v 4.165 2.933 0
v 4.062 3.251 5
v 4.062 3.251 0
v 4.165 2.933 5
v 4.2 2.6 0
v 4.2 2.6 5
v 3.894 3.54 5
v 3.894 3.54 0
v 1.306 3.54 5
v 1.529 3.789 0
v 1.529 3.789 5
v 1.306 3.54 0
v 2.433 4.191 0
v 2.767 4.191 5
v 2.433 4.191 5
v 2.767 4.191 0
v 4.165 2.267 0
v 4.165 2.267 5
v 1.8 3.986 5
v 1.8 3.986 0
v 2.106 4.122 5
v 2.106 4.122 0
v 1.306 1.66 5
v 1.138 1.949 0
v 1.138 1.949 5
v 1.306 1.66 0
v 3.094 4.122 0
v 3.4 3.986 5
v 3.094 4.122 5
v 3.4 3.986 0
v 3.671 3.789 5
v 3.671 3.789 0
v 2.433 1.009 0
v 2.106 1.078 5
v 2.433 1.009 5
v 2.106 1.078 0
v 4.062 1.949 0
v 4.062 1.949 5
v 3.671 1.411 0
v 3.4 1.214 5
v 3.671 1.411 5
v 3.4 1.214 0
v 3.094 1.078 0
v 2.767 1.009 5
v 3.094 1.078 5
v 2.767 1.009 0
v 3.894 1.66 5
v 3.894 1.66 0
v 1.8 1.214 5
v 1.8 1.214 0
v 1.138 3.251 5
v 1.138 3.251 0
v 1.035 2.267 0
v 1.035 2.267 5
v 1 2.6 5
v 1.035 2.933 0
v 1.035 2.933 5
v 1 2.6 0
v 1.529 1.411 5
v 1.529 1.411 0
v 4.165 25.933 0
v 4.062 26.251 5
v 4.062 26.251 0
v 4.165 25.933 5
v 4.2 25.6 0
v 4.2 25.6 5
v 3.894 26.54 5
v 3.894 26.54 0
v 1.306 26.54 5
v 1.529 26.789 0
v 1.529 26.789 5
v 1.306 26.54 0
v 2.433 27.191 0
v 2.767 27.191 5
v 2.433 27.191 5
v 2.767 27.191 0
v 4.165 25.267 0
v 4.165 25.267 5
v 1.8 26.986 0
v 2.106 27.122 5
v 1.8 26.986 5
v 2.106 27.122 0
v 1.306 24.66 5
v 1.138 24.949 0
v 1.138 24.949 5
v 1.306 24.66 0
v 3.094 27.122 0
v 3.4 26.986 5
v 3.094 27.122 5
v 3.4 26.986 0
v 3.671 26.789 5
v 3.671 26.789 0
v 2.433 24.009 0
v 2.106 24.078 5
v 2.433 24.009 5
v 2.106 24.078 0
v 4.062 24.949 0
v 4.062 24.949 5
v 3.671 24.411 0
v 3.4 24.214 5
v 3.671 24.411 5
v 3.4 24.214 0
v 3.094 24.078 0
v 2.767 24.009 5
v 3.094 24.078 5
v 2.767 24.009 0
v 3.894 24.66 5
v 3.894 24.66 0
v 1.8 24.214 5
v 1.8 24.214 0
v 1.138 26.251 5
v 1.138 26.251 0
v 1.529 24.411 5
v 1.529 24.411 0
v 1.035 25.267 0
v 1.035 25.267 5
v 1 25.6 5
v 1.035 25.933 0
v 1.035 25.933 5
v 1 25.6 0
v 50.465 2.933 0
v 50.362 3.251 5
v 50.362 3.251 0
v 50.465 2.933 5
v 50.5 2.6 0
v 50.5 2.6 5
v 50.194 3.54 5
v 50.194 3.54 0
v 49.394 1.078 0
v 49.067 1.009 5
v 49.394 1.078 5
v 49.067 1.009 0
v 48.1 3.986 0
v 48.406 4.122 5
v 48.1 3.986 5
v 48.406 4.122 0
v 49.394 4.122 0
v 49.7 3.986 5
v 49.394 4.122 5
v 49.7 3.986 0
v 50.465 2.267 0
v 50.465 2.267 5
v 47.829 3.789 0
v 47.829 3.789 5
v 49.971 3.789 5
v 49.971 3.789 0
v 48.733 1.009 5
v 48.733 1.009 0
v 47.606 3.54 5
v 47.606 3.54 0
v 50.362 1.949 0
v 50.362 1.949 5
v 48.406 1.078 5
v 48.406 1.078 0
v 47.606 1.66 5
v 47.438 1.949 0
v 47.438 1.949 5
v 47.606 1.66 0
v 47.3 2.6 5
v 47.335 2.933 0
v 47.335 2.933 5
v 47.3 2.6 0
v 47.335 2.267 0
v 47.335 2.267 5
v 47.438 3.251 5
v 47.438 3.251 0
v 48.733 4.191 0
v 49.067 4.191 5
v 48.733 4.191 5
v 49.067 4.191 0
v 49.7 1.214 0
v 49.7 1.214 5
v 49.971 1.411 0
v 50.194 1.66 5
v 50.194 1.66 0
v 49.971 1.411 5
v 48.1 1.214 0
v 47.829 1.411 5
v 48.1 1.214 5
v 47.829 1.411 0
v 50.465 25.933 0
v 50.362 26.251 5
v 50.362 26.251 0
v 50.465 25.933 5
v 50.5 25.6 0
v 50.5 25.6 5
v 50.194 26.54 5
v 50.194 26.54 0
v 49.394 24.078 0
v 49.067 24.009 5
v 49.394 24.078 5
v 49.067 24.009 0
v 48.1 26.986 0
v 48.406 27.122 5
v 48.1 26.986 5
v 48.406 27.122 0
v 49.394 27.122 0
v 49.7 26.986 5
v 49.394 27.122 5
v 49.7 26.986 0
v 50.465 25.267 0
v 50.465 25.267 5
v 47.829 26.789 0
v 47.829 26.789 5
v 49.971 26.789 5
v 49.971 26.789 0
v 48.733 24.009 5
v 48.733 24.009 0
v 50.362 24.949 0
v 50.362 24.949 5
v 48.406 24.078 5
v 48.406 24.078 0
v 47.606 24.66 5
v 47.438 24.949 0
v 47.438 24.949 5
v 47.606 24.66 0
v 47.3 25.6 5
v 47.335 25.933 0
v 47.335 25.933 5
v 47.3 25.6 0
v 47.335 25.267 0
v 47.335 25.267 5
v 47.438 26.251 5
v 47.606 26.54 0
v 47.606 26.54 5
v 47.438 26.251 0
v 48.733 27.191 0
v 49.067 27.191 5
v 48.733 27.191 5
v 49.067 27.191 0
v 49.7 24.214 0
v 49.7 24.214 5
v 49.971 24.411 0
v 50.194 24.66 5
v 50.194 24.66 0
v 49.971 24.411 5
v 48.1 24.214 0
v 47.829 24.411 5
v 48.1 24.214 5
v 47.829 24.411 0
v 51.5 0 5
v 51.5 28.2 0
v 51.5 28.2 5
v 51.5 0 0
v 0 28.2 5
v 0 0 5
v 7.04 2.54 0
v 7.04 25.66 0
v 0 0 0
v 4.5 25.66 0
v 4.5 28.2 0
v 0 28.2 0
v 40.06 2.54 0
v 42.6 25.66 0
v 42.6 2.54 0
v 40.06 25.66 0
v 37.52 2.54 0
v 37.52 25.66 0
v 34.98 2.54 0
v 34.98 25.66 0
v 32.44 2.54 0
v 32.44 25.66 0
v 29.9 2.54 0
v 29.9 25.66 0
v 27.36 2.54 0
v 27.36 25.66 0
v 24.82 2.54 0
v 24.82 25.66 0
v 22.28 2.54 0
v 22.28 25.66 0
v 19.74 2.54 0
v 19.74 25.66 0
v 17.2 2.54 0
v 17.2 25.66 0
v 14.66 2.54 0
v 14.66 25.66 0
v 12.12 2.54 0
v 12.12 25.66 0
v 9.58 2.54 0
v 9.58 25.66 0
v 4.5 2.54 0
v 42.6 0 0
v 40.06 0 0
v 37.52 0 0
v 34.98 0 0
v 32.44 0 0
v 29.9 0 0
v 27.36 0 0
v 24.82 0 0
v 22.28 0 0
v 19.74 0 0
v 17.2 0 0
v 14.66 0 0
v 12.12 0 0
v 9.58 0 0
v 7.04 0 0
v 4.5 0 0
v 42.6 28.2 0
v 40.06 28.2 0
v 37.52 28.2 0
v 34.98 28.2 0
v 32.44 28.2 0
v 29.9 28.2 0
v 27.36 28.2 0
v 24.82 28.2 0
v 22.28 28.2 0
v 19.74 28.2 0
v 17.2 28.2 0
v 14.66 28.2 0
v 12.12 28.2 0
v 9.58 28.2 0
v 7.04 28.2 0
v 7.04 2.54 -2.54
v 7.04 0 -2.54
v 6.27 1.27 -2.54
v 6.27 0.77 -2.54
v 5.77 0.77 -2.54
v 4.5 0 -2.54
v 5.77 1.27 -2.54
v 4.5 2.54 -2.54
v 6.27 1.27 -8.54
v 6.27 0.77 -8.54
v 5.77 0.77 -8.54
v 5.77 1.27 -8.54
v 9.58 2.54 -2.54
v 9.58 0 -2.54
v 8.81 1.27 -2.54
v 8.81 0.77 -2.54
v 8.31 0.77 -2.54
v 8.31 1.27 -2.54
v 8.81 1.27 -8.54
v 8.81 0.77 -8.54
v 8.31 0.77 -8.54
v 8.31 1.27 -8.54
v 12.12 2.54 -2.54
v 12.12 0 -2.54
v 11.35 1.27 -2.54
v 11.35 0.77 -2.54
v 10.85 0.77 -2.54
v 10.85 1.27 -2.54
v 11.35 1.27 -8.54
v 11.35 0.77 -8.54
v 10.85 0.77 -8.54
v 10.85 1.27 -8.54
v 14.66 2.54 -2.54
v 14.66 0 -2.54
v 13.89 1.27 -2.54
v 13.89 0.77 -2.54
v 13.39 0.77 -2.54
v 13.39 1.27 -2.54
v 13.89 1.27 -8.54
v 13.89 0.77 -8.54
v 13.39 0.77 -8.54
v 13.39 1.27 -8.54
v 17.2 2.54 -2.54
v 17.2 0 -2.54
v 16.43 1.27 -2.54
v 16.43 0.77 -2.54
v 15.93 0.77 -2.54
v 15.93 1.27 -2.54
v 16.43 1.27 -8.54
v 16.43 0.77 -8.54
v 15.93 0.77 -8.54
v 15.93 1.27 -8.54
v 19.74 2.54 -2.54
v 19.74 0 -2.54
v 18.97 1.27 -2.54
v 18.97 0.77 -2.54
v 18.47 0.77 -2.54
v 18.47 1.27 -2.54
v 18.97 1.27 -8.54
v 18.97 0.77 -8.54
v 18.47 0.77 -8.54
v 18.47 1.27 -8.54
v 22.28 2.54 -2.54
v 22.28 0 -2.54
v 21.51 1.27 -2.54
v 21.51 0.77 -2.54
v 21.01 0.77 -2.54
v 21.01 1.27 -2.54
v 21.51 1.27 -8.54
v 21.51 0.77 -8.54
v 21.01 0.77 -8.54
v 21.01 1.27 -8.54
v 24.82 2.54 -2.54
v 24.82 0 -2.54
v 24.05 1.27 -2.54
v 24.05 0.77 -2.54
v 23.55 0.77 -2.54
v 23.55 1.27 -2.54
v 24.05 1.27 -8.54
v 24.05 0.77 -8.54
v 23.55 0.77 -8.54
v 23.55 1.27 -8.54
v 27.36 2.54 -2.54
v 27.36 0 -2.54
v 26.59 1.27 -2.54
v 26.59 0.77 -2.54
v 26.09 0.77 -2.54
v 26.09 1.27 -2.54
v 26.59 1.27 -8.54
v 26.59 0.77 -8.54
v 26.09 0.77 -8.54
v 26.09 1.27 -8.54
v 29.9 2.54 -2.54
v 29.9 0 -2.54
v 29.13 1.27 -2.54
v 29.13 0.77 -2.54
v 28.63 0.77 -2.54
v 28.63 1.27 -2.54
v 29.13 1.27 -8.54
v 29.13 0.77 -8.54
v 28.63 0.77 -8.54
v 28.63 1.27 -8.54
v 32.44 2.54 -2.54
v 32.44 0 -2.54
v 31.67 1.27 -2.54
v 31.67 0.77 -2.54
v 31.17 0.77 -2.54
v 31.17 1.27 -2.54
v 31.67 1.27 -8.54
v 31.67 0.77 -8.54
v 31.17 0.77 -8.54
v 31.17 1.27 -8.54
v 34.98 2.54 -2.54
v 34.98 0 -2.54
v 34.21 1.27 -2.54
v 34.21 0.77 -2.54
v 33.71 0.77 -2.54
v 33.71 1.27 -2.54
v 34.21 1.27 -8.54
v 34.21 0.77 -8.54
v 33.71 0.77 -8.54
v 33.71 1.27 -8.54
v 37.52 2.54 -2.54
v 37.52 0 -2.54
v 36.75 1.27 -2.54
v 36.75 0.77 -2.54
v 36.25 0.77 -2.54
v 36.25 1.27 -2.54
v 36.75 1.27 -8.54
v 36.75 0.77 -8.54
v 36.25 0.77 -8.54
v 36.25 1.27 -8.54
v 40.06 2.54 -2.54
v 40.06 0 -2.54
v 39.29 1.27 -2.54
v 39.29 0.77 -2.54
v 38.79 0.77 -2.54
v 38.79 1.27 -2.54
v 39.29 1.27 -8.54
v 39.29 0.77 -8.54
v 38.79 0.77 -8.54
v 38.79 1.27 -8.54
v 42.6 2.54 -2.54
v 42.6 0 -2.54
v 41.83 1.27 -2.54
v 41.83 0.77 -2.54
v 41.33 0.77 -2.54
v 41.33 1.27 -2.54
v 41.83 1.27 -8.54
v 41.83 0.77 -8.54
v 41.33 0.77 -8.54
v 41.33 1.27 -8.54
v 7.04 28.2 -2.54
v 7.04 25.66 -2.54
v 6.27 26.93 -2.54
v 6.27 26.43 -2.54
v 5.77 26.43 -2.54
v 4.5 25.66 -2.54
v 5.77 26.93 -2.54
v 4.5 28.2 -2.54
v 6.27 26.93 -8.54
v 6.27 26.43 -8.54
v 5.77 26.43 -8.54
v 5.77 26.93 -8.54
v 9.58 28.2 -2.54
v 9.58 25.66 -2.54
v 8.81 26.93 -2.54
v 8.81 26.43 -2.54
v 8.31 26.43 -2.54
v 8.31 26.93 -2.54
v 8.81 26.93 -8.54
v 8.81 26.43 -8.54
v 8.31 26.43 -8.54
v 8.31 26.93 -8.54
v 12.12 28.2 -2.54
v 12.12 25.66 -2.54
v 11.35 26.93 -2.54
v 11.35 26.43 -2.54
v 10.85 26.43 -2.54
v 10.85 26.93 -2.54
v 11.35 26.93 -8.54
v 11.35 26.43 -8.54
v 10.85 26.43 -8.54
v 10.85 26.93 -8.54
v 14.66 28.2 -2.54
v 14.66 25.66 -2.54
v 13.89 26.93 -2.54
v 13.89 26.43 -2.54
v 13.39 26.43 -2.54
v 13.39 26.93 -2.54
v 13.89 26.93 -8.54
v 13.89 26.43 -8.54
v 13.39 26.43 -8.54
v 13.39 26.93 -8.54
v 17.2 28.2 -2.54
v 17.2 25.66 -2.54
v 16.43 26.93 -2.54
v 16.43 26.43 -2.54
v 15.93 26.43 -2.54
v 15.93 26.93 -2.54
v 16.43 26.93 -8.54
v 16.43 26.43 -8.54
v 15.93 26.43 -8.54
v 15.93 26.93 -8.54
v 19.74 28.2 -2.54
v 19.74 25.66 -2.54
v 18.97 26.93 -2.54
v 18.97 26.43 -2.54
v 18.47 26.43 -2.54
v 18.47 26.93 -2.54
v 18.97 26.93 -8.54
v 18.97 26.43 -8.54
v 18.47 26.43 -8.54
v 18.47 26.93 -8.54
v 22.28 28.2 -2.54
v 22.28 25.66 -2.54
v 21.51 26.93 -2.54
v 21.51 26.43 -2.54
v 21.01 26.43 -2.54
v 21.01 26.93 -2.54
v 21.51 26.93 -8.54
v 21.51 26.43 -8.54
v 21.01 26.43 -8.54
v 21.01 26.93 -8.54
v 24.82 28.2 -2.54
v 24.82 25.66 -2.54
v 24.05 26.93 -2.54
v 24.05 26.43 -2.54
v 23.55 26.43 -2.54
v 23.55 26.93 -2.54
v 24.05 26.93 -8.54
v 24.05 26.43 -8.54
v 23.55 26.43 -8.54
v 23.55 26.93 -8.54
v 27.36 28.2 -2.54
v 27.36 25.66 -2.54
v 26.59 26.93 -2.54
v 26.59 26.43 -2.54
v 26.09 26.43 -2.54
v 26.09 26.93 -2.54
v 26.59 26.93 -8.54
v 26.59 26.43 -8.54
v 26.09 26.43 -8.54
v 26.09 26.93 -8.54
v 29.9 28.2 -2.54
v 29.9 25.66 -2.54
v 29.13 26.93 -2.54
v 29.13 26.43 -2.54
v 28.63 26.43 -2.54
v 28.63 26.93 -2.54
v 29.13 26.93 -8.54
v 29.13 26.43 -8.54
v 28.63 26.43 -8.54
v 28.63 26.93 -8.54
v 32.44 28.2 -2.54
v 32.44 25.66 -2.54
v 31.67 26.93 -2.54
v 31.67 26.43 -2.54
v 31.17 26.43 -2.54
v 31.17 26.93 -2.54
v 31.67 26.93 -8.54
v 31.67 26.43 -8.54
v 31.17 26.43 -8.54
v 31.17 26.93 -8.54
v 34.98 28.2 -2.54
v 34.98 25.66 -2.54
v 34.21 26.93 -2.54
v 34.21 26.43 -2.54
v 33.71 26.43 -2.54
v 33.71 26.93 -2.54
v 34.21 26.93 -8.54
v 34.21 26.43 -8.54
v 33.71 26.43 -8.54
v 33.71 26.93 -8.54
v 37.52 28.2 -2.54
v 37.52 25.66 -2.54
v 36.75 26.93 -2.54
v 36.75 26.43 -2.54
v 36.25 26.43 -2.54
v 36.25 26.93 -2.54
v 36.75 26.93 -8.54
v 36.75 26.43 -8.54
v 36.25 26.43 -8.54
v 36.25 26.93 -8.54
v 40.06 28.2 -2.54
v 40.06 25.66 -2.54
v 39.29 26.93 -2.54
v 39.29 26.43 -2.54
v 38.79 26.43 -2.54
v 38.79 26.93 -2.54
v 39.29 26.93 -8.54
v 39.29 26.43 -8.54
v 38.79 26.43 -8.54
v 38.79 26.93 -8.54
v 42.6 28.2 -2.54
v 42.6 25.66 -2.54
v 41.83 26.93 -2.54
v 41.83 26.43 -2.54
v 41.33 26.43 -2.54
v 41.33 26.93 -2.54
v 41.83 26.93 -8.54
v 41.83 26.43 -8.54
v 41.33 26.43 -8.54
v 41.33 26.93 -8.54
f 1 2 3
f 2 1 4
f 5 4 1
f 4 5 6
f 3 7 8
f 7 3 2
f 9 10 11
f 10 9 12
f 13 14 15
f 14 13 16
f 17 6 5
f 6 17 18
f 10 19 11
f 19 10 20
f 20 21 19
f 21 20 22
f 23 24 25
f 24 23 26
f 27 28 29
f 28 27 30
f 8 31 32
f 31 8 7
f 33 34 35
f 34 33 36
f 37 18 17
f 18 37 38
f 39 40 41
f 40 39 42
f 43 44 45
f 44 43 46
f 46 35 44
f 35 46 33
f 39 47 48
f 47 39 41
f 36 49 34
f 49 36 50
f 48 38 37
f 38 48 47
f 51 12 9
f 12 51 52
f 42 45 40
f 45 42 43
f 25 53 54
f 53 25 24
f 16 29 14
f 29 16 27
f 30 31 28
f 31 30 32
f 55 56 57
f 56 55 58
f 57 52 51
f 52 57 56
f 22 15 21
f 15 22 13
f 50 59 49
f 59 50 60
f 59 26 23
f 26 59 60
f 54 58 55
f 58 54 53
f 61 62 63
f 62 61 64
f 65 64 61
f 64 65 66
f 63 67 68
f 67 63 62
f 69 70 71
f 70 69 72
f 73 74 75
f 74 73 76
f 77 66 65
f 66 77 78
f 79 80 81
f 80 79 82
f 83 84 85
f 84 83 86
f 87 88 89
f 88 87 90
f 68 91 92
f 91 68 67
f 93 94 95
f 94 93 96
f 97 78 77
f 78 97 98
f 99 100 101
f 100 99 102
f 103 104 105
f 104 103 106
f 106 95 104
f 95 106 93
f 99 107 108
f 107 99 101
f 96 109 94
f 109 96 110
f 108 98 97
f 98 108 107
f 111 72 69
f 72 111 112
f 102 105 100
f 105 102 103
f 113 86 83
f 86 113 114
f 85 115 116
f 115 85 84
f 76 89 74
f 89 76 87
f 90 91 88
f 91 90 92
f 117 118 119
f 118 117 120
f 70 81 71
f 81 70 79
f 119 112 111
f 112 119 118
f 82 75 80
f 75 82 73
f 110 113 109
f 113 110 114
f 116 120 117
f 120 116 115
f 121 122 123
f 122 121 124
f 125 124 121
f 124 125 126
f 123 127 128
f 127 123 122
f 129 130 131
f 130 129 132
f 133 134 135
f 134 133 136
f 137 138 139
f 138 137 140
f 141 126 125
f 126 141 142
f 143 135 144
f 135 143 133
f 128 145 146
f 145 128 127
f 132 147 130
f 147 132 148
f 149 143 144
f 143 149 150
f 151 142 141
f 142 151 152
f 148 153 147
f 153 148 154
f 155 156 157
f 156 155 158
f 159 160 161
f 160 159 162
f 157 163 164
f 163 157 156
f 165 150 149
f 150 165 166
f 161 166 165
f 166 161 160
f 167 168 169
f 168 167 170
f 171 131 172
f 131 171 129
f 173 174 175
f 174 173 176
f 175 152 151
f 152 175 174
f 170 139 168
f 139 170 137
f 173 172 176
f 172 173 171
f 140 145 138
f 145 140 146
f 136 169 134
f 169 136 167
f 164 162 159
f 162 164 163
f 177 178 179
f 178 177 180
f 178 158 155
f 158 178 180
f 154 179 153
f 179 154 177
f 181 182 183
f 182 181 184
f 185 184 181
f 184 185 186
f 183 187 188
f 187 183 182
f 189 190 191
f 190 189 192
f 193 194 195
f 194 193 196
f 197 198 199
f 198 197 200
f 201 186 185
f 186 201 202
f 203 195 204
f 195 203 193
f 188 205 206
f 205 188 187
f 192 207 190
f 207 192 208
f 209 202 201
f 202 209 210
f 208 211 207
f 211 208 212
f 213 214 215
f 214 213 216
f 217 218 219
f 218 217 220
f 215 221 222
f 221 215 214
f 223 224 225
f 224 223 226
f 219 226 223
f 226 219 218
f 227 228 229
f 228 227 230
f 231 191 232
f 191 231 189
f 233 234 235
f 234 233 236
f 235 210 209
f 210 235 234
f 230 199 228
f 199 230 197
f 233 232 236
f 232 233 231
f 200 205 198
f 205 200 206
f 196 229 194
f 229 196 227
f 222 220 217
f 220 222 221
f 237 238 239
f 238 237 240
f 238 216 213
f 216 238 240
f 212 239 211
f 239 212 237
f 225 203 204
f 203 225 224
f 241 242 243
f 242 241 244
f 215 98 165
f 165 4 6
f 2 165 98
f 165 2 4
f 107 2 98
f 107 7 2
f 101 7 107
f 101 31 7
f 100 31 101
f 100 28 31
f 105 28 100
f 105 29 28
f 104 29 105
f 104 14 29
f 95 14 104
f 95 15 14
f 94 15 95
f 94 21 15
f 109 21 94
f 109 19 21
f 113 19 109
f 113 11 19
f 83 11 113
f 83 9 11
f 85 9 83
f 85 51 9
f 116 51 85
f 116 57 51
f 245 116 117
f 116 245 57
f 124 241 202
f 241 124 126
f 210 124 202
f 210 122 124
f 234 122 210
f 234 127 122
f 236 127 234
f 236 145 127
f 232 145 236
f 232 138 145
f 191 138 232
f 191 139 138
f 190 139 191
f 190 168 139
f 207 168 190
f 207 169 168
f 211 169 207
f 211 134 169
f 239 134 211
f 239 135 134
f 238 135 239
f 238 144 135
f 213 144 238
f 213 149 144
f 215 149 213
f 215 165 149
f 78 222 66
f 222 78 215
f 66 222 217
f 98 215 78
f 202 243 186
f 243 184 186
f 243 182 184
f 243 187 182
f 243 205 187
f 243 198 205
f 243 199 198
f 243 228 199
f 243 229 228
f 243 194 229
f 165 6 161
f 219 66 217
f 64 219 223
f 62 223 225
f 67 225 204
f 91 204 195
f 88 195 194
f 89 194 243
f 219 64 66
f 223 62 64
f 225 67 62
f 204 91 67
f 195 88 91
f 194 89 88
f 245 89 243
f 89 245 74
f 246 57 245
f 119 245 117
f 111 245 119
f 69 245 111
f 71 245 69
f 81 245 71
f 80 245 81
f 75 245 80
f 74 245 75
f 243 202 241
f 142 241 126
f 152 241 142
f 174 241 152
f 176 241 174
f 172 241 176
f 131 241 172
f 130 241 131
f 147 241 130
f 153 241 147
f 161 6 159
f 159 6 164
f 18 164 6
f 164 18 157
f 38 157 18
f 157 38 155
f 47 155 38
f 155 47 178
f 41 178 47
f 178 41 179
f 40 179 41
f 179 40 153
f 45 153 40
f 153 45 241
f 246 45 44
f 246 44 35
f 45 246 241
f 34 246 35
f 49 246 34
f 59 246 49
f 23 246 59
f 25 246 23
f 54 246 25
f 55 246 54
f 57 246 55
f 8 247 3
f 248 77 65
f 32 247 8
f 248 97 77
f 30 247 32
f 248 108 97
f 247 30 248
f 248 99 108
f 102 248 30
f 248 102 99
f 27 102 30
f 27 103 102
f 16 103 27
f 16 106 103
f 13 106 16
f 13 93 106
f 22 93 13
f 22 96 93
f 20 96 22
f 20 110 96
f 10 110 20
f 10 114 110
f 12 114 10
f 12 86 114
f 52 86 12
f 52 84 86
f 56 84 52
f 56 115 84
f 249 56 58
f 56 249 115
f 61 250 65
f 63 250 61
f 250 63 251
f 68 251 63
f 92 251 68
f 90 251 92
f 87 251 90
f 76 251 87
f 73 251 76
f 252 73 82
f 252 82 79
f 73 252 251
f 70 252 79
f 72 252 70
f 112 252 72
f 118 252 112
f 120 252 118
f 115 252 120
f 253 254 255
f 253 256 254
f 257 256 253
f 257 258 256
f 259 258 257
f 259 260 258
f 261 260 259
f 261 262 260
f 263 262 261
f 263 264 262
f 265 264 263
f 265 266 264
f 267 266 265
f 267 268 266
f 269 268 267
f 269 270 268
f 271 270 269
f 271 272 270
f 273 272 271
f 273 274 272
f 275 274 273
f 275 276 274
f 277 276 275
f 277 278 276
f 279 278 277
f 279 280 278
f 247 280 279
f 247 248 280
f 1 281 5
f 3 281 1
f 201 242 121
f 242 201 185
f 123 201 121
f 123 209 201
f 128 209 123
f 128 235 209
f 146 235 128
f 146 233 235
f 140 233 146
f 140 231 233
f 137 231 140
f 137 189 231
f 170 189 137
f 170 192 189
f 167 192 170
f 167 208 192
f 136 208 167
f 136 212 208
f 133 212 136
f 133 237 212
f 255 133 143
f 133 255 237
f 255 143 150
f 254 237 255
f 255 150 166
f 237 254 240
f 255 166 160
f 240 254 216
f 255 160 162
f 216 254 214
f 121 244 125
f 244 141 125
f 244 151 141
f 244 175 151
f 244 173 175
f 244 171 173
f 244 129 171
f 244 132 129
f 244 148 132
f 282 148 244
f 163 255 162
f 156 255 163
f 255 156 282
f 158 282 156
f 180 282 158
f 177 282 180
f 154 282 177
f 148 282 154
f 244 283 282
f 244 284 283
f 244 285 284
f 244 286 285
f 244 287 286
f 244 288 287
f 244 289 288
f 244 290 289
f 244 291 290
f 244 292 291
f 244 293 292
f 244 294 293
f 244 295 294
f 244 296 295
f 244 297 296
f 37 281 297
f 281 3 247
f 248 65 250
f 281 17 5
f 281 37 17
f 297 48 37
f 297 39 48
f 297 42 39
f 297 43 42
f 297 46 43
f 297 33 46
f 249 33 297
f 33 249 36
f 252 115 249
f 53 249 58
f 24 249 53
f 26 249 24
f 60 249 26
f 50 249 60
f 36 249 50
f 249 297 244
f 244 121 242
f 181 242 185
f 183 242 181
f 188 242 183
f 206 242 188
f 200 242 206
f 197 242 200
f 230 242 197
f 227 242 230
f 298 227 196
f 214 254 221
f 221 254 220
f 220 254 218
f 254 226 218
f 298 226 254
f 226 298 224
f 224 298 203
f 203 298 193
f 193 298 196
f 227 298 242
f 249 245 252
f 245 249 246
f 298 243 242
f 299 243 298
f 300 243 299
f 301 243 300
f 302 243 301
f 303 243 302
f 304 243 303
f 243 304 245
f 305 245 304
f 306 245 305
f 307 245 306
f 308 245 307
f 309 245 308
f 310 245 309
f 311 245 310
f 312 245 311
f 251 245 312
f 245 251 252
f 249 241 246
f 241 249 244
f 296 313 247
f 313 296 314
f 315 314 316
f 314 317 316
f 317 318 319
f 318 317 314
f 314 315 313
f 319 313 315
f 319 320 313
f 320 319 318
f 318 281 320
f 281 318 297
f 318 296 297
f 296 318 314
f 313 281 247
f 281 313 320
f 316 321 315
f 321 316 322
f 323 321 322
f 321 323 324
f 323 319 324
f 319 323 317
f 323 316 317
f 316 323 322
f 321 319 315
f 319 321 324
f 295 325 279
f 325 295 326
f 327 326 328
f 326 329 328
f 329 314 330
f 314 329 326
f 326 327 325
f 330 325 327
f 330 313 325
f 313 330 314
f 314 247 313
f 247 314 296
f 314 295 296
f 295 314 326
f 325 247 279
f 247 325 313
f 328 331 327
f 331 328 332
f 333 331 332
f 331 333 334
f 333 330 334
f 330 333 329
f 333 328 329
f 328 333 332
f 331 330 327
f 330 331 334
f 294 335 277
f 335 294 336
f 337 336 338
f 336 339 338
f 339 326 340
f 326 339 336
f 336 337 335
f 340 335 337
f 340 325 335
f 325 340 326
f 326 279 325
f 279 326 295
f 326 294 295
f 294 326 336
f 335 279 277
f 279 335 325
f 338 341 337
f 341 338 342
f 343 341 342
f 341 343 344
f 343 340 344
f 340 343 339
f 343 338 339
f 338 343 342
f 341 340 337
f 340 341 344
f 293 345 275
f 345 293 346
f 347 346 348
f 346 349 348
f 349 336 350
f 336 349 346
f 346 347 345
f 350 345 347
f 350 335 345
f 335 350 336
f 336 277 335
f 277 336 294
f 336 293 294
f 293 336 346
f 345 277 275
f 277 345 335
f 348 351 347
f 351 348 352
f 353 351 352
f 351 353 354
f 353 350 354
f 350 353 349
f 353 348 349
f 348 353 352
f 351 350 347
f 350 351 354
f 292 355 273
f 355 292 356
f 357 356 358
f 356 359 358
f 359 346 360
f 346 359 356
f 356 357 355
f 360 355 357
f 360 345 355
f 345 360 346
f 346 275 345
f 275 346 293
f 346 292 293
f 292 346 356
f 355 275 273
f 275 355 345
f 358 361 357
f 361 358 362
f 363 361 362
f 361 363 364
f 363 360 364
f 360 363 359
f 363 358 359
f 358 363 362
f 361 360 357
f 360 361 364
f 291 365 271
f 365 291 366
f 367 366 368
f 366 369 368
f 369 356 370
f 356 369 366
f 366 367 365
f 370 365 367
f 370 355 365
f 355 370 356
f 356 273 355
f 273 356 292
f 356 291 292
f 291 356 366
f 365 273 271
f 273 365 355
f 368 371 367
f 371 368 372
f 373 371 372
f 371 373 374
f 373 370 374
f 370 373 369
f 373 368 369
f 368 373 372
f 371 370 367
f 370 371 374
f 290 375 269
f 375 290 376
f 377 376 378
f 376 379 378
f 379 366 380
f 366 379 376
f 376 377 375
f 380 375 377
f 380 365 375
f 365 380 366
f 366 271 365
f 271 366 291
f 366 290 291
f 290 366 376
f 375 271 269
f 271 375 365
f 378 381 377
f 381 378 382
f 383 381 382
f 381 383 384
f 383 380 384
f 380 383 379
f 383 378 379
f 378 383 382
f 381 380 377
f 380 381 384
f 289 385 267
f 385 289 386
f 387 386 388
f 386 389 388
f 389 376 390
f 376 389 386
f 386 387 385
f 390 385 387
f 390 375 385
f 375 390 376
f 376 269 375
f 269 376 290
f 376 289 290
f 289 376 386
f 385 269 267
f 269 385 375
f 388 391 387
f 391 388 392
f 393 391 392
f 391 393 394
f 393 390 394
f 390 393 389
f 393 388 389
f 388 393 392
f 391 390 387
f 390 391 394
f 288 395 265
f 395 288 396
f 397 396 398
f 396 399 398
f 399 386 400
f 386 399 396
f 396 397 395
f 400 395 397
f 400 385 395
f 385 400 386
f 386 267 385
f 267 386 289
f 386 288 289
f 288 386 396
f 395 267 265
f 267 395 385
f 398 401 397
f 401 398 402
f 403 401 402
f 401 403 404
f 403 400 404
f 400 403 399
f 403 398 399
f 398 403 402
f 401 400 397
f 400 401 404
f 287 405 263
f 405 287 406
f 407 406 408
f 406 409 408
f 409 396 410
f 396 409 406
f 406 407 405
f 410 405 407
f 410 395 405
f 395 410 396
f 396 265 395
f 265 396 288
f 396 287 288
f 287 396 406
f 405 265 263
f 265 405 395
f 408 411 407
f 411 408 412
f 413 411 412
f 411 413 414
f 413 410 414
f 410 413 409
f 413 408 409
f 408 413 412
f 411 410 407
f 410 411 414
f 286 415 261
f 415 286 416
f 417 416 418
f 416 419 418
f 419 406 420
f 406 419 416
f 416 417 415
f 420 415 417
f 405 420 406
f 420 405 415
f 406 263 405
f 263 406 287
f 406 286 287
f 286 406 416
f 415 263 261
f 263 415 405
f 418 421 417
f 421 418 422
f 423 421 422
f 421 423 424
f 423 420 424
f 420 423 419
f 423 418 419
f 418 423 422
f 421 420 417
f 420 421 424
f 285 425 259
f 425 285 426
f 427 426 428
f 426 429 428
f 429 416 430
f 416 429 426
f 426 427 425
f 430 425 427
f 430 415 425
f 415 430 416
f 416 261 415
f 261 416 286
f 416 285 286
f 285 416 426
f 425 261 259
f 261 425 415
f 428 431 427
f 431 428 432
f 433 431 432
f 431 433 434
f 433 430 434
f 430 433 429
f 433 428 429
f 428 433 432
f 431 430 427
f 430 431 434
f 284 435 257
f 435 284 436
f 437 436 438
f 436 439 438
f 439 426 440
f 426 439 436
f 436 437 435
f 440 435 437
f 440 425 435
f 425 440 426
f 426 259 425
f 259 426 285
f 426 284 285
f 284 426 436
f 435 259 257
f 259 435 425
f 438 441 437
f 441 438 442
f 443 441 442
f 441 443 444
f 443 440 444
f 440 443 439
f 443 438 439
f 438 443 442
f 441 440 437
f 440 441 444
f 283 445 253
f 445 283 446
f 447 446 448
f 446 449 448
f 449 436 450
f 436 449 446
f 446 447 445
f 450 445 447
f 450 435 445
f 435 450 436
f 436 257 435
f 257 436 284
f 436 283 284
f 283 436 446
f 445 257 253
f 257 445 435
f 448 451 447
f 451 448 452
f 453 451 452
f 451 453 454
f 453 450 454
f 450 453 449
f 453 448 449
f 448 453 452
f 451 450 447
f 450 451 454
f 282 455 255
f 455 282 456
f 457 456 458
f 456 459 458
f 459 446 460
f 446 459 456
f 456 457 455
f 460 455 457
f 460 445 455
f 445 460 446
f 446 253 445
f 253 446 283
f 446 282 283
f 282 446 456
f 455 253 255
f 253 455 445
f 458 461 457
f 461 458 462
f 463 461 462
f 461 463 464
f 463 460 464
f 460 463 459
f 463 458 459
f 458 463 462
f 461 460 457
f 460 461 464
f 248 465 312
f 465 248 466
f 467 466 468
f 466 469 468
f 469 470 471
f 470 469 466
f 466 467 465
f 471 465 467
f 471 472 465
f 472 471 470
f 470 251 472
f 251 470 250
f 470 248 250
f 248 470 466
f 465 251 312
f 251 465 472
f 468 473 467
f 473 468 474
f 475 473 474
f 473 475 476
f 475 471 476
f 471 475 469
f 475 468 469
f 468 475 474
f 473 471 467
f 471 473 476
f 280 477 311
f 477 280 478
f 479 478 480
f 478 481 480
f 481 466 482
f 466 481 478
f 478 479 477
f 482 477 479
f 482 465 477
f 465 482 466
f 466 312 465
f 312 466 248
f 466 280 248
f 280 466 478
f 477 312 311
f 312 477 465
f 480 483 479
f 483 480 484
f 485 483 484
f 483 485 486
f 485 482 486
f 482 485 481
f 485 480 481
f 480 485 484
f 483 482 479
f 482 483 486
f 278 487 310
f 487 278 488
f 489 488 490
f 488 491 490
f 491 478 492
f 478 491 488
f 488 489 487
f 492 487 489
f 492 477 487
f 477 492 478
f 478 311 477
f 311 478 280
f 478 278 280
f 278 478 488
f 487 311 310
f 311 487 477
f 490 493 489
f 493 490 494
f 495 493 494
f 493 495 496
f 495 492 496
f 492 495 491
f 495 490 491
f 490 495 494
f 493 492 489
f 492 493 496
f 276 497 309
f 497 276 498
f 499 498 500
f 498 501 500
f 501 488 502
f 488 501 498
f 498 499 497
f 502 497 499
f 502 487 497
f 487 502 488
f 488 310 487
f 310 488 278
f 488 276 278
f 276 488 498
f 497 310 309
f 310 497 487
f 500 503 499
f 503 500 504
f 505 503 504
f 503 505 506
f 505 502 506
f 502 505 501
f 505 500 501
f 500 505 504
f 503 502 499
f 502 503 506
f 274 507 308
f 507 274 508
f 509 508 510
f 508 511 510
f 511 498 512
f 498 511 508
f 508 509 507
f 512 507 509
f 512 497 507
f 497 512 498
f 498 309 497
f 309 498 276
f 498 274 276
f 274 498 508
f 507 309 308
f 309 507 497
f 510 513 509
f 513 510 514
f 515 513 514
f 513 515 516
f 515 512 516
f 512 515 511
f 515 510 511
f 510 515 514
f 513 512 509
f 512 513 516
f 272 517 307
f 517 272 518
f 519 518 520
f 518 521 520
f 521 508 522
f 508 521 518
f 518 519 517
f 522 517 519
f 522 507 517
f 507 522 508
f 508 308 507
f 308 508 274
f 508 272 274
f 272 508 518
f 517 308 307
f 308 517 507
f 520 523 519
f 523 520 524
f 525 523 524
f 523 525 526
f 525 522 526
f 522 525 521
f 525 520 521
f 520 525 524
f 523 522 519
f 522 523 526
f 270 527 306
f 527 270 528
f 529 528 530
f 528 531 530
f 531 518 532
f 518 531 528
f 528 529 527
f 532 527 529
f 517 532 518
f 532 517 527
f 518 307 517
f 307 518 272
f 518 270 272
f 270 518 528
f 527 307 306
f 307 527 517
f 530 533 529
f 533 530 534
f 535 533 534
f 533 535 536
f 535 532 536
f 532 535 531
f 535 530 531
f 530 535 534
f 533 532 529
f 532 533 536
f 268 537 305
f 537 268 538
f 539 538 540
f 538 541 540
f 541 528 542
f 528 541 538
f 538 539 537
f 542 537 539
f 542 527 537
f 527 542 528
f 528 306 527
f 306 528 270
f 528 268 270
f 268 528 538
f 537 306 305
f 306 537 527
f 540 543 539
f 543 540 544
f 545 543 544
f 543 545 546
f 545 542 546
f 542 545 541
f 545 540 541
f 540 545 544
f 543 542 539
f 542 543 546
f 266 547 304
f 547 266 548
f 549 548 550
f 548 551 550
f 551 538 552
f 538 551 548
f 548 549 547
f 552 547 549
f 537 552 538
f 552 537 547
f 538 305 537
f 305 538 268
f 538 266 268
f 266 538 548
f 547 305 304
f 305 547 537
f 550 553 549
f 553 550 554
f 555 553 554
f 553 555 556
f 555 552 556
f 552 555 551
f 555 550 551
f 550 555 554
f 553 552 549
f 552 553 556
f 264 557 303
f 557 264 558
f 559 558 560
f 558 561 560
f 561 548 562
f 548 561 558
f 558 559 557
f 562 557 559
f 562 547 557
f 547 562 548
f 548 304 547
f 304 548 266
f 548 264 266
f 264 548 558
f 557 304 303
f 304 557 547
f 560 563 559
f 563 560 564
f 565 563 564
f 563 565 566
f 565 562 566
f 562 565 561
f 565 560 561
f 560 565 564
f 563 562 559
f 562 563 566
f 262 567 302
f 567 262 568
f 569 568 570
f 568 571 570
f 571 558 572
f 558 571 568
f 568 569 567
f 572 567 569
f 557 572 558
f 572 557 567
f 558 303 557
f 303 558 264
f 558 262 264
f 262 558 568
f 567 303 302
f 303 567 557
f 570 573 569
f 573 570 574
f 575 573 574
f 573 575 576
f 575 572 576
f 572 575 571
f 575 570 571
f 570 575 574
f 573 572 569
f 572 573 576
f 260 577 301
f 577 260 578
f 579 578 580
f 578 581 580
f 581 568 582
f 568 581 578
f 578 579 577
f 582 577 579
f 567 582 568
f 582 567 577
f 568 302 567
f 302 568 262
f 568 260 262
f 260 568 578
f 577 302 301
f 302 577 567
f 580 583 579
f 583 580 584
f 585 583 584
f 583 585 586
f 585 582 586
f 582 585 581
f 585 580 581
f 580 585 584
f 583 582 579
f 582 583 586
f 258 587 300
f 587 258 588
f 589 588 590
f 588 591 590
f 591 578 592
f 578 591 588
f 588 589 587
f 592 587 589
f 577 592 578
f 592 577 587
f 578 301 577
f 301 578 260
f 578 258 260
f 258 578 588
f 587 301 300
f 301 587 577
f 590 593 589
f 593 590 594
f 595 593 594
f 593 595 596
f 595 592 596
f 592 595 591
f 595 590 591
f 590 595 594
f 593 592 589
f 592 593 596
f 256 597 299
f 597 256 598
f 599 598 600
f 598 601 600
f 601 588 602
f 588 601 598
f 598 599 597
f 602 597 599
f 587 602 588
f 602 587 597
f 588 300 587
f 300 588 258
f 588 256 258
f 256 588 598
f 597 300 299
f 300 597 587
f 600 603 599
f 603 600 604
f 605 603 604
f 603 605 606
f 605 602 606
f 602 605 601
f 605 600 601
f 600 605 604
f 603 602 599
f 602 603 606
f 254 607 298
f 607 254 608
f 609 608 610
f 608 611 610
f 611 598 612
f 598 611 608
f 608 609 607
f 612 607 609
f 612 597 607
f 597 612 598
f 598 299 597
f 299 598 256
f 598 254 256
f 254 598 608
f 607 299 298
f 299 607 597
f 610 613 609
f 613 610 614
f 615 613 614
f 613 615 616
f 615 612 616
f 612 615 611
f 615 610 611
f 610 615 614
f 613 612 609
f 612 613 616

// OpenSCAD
// file: esp32_nodeMCU_dimensions.scad
// ESP32 NodeMCU dimensions
esp32_height = 5;
esp32_width = 28.2;
esp32_length = 51.5;

esp32_screw_hole_radius = 1.6;
esp32_screw_hole_margin = 1;
// main file
include<esp32_nodeMCU_dimensions.scad>;

module ESP32_nodeMCU() {
    $fn = 30;

    eps = 0.01;

    black = [0.05, 0.05, 0.05];
    gray = [0.5, 0.5, 0.5];

    module chassis() {
        color(gray) {
            translate([0, 0, 0]) {
                cube([esp32_length, esp32_width, esp32_height]);
            }
        }
    }

    module pin() {
        union() {
            color(black) {
                cube(2.54);
            }
            translate([2.54/2, 2.54/2, 2.54]) {
                color(gray) {
                    cube([0.5, 0.5, 6]);
                }
            }
        }
    }

    module pin_header() {
        union() {
            for (i = [0:14]) {
                translate([i*2.54, 0, 0])
                    pin();
            }
        }
    }

    module screw_hole() {
        cylinder(esp32_height + eps, d=2*esp32_screw_hole_radius);
    }

    difference() {
        chassis();
        screw_hole_distance = esp32_screw_hole_radius + esp32_screw_hole_margin;
        for (i = [screw_hole_distance, esp32_length - screw_hole_distance]) {
            for (j = [screw_hole_distance, esp32_width - screw_hole_distance]) {
                translate([i, j, -eps/2])
                    screw_hole();
            }
        }
    }
    translate([4.5, 2.54, 0])
        rotate([180, 0, 0])
            pin_header();
    translate([4.5, esp32_width, 0]) 
        rotate([180, 0, 0])
            pin_header();
}

// Example usage:
ESP32_nodeMCU();
